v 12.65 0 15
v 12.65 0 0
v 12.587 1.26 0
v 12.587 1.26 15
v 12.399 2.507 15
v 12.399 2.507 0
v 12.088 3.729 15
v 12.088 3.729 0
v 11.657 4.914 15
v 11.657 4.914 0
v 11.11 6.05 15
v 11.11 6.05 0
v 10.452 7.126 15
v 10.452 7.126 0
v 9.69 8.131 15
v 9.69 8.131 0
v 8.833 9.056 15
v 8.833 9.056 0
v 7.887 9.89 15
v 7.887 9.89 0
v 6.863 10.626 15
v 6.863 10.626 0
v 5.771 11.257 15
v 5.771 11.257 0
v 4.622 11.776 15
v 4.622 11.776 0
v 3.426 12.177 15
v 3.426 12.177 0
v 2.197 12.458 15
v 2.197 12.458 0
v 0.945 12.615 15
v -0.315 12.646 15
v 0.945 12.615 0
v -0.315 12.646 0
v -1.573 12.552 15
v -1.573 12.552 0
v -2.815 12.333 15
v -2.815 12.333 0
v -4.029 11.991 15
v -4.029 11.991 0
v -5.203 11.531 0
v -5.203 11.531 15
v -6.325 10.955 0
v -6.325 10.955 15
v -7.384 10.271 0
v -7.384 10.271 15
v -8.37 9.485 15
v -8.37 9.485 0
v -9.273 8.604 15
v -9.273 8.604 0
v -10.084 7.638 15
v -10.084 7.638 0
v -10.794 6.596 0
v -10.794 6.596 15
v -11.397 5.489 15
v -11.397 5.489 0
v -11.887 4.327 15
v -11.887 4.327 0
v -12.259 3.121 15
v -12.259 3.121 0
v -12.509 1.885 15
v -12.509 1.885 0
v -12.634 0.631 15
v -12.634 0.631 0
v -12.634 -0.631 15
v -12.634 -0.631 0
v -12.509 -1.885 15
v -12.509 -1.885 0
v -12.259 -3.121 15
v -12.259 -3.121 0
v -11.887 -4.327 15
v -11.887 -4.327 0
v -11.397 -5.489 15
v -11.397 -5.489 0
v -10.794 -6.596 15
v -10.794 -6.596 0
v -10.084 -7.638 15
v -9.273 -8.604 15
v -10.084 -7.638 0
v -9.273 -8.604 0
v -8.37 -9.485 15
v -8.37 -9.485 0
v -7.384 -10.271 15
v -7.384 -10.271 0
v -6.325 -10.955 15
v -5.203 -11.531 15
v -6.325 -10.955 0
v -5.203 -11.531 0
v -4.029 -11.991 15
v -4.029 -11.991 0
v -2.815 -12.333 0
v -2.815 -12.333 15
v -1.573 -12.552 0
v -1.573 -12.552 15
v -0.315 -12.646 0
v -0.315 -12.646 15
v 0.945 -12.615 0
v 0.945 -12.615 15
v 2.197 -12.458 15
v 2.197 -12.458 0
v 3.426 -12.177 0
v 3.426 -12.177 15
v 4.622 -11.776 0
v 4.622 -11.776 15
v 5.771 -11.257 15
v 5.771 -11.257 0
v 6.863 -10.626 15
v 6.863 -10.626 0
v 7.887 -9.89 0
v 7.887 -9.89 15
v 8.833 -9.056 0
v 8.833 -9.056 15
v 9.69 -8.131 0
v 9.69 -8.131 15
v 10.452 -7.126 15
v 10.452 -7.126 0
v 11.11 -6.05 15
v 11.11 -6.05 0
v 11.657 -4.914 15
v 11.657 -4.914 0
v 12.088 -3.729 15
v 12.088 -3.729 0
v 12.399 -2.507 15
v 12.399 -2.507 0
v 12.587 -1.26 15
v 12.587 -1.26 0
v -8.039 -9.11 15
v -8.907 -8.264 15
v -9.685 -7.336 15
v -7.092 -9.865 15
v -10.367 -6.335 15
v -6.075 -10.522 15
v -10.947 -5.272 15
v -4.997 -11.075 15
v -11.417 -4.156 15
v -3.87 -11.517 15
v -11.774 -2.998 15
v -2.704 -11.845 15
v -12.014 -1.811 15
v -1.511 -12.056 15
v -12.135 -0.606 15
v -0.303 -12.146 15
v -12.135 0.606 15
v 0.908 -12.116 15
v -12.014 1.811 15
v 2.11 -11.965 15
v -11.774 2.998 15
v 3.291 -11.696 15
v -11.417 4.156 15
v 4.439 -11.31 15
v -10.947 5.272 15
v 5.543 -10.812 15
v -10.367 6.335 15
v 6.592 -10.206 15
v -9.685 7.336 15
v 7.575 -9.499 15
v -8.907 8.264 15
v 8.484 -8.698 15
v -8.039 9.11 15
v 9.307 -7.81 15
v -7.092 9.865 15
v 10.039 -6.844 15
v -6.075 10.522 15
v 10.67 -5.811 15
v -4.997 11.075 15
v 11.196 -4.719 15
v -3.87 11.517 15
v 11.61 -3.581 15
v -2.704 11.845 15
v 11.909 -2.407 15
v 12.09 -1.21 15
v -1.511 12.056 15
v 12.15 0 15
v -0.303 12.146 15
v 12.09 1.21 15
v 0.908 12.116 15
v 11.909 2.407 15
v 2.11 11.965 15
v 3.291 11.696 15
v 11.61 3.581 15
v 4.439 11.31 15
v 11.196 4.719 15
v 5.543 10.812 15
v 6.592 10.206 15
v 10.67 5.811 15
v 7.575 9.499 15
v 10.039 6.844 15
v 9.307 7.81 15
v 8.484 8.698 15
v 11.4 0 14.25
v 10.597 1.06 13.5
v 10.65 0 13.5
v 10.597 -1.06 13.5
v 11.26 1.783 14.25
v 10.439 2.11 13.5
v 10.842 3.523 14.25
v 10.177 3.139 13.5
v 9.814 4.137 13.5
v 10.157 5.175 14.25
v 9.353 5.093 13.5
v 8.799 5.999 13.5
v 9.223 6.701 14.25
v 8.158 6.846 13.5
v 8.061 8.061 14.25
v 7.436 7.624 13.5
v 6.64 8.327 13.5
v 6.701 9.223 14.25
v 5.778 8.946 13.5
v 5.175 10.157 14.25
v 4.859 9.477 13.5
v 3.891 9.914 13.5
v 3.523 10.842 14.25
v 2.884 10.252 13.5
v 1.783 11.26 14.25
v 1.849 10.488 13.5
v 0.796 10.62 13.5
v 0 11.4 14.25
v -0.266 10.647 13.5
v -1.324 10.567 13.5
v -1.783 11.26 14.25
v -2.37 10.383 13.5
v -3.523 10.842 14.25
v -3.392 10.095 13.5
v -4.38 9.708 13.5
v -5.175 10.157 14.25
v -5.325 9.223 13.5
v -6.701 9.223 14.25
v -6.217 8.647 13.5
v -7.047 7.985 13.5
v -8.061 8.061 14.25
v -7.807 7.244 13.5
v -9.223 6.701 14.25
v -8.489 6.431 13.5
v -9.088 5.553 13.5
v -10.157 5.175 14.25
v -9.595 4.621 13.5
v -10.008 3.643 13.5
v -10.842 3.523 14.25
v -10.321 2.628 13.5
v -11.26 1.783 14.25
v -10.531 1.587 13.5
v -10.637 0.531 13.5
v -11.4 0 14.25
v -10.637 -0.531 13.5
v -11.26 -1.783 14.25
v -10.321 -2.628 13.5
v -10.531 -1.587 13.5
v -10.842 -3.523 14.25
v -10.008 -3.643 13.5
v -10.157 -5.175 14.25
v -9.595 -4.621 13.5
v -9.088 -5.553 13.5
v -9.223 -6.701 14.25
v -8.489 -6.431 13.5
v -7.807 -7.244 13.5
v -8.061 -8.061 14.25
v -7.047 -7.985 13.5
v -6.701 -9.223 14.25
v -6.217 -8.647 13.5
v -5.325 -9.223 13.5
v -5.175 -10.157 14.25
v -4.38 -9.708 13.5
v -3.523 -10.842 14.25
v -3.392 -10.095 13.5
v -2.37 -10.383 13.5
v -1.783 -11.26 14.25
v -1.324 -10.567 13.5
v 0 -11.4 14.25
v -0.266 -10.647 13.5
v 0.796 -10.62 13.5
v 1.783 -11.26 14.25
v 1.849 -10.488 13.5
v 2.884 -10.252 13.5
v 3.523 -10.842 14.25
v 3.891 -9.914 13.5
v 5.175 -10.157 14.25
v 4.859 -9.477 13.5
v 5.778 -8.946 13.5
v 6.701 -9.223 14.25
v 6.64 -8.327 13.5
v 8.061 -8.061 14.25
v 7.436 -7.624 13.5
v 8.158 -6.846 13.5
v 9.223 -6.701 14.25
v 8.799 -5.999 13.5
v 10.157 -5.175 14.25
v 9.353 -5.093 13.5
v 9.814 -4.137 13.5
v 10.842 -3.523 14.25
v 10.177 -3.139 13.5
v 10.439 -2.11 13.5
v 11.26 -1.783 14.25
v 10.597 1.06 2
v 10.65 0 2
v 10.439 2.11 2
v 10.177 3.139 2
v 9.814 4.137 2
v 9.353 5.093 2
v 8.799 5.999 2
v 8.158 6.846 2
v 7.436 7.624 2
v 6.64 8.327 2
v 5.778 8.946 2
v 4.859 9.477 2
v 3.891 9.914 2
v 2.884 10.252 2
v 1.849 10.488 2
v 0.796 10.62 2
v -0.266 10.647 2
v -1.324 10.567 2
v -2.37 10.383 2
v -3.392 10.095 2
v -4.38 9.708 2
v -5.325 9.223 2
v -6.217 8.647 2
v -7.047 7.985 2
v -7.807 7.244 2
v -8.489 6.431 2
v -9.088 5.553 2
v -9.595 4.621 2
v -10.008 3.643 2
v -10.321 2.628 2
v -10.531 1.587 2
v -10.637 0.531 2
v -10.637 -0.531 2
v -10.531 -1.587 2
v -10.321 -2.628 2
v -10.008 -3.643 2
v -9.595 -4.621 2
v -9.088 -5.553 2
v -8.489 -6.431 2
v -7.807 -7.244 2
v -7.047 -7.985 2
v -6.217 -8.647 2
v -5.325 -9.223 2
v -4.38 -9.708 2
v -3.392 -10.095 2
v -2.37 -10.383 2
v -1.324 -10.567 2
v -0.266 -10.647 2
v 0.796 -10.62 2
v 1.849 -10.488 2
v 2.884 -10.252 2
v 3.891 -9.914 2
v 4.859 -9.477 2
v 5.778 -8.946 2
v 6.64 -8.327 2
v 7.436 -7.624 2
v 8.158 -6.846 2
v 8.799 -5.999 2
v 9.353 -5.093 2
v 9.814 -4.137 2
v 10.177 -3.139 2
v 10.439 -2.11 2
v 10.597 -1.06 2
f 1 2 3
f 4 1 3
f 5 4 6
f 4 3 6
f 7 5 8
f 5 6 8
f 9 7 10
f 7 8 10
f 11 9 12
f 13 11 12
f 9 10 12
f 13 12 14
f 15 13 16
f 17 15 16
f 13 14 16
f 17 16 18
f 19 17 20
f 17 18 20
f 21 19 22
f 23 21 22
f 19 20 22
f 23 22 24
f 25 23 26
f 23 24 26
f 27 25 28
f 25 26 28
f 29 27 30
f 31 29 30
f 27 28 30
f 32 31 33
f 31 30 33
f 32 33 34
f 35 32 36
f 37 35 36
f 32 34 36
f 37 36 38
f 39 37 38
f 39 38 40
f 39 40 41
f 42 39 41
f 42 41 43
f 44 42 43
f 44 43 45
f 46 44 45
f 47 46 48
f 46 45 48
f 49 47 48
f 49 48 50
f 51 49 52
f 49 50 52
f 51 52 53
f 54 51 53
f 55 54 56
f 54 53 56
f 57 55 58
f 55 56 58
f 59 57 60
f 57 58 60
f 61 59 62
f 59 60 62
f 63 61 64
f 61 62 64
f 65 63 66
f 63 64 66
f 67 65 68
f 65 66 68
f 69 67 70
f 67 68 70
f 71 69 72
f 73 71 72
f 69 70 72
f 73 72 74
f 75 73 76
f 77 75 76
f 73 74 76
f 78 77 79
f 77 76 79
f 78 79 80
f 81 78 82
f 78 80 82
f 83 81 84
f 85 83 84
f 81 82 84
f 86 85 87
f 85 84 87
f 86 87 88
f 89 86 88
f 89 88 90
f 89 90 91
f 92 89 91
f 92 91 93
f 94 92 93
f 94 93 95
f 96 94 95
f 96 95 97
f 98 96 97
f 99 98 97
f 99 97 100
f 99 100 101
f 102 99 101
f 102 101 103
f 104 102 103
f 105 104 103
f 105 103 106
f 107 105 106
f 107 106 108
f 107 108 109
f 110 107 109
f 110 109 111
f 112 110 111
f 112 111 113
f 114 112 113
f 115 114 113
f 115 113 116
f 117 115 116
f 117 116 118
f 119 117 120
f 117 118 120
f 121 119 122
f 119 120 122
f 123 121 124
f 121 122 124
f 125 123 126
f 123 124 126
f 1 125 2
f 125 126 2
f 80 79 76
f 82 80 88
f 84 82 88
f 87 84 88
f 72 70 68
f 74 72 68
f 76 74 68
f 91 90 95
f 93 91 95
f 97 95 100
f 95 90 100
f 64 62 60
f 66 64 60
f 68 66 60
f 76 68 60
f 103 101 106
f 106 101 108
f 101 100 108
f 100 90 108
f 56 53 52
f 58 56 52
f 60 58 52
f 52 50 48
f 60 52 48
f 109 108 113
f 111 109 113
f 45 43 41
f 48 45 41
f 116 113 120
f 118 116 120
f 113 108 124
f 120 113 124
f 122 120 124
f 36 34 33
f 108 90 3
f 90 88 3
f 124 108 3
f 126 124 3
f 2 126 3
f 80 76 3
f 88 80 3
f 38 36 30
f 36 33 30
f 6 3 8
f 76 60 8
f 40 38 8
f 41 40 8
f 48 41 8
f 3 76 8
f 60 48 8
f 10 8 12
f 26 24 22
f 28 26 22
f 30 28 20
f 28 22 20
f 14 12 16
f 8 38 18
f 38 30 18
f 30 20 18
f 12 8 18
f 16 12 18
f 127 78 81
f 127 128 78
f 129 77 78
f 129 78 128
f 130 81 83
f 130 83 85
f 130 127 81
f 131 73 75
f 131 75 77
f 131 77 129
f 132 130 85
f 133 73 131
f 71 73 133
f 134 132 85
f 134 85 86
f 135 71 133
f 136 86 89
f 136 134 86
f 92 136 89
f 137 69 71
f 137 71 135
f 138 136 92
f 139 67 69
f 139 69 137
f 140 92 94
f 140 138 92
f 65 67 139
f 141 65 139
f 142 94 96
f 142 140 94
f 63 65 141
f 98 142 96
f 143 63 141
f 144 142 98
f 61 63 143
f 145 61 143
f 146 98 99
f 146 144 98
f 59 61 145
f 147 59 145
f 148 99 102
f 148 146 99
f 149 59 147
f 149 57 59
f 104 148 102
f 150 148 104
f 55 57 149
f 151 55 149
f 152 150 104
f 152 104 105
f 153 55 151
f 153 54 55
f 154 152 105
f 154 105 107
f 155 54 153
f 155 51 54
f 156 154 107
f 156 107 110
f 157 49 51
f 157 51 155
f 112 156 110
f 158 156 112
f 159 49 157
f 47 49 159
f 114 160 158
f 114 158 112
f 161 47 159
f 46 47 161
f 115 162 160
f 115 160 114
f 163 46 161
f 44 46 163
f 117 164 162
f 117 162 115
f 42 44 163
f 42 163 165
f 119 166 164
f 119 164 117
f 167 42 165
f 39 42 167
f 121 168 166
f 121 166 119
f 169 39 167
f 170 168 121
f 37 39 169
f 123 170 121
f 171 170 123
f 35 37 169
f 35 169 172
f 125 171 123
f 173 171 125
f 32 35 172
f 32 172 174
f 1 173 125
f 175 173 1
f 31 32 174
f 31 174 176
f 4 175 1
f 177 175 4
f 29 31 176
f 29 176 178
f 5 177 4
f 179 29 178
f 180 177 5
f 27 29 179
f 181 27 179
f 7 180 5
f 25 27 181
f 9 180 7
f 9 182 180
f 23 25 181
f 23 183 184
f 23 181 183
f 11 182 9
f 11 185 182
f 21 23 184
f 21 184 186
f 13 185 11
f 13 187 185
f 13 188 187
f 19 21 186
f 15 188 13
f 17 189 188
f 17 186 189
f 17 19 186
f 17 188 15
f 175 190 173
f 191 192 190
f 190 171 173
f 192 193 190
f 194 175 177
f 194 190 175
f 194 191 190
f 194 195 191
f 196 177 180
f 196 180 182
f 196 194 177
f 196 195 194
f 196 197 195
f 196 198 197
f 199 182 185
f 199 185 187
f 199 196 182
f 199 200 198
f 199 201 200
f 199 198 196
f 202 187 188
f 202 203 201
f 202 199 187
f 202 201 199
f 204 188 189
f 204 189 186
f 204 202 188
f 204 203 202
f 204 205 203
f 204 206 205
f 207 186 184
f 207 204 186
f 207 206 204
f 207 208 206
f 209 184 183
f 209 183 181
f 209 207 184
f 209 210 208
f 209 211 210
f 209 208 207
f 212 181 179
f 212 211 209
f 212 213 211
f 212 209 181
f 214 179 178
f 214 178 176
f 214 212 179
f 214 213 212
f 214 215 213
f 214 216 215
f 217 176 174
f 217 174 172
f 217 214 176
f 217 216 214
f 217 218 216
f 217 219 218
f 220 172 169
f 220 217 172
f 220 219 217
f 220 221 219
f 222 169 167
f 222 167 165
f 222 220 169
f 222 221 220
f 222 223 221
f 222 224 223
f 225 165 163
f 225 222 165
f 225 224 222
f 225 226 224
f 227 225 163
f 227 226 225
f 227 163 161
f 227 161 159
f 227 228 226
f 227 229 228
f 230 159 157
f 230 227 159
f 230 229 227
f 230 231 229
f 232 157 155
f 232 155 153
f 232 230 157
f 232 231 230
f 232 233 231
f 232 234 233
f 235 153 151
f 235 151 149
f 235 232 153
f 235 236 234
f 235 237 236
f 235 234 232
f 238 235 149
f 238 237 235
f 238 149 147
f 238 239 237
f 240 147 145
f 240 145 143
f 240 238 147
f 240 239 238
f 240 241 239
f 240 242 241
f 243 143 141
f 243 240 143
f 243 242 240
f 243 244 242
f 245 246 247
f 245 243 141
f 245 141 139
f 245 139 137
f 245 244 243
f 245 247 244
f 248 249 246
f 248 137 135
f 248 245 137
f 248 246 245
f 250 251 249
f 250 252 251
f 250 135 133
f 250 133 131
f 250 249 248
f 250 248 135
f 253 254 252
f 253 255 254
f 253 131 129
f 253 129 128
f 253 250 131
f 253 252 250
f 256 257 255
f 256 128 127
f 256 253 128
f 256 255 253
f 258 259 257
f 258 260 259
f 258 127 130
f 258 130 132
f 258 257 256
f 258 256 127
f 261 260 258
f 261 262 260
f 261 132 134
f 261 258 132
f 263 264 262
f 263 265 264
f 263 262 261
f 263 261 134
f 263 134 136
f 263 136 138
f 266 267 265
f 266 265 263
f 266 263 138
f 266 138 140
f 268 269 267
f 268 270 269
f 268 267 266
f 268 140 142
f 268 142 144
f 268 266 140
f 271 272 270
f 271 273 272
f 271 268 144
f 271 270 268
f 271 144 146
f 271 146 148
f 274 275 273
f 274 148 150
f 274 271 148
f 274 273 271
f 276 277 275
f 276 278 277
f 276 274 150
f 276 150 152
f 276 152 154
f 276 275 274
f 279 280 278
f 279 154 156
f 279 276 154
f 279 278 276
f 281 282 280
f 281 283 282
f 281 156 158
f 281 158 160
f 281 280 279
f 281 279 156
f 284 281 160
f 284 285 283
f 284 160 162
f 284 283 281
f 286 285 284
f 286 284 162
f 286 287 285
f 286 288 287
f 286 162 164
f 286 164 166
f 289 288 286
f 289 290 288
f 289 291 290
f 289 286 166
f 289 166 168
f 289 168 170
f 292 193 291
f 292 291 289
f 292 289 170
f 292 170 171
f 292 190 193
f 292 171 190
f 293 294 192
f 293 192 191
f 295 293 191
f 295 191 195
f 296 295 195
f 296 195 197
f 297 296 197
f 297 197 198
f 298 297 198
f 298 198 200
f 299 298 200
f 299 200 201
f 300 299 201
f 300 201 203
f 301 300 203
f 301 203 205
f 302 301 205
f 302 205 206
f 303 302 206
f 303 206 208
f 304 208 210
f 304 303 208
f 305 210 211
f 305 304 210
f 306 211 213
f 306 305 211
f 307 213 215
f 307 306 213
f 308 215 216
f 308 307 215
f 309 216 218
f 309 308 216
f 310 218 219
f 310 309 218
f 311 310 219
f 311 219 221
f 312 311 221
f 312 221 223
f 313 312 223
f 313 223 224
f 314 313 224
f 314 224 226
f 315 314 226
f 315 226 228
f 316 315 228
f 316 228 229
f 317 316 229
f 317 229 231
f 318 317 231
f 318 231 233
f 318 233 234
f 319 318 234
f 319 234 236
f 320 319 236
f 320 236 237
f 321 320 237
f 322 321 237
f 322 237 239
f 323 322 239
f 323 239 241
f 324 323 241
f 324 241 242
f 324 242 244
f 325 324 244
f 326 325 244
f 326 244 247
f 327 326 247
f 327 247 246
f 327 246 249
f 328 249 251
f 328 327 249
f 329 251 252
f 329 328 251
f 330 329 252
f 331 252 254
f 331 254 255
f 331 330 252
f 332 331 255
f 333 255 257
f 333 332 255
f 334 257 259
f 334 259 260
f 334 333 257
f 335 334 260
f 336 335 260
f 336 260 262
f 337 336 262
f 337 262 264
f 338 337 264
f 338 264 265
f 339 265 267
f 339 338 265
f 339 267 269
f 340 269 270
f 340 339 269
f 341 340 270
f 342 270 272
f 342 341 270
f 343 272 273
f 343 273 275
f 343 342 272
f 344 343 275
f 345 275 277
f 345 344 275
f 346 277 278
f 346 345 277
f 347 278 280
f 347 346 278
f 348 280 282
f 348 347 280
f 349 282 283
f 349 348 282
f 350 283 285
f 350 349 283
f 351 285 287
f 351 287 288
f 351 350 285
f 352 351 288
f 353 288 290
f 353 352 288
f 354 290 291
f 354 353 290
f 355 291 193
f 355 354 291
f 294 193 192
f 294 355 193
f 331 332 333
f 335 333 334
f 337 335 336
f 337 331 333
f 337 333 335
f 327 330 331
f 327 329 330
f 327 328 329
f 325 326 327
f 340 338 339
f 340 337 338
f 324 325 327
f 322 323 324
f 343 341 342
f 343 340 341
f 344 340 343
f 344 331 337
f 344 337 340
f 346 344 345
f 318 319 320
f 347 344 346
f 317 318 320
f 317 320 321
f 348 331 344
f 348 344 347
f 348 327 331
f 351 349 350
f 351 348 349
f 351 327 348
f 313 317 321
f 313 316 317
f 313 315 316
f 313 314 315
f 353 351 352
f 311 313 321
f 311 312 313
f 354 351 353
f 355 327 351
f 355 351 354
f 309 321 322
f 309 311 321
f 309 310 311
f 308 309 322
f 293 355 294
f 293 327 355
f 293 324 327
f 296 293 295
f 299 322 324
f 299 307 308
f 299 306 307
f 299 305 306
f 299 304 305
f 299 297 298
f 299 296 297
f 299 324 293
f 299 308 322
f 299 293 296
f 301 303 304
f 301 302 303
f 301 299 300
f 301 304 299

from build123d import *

# Parameters (mm, degrees)
F0_R     = 12.65
F1_DEPTH = 15
F2_T     = -2
F3_SIZE  = 1.5


with BuildPart() as f1:
    # F0 (on Top) → F1 (new body)
    with BuildSketch(Plane.XY):
        Circle(F0_R)
    extrude(amount=F1_DEPTH)

    # F2
    f2_openings = [f1.faces().sort_by_distance(p)[0] for p in [
        (0, 0, 15),
    ]]
    offset(amount=F2_T, openings=f2_openings)

    # F3
    f3_edges = [f1.edges().sort_by_distance(p)[0] for p in [
        (-10.65, 0, 15),
    ]]
    chamfer(f3_edges, length=F3_SIZE)


solid = f1.part
